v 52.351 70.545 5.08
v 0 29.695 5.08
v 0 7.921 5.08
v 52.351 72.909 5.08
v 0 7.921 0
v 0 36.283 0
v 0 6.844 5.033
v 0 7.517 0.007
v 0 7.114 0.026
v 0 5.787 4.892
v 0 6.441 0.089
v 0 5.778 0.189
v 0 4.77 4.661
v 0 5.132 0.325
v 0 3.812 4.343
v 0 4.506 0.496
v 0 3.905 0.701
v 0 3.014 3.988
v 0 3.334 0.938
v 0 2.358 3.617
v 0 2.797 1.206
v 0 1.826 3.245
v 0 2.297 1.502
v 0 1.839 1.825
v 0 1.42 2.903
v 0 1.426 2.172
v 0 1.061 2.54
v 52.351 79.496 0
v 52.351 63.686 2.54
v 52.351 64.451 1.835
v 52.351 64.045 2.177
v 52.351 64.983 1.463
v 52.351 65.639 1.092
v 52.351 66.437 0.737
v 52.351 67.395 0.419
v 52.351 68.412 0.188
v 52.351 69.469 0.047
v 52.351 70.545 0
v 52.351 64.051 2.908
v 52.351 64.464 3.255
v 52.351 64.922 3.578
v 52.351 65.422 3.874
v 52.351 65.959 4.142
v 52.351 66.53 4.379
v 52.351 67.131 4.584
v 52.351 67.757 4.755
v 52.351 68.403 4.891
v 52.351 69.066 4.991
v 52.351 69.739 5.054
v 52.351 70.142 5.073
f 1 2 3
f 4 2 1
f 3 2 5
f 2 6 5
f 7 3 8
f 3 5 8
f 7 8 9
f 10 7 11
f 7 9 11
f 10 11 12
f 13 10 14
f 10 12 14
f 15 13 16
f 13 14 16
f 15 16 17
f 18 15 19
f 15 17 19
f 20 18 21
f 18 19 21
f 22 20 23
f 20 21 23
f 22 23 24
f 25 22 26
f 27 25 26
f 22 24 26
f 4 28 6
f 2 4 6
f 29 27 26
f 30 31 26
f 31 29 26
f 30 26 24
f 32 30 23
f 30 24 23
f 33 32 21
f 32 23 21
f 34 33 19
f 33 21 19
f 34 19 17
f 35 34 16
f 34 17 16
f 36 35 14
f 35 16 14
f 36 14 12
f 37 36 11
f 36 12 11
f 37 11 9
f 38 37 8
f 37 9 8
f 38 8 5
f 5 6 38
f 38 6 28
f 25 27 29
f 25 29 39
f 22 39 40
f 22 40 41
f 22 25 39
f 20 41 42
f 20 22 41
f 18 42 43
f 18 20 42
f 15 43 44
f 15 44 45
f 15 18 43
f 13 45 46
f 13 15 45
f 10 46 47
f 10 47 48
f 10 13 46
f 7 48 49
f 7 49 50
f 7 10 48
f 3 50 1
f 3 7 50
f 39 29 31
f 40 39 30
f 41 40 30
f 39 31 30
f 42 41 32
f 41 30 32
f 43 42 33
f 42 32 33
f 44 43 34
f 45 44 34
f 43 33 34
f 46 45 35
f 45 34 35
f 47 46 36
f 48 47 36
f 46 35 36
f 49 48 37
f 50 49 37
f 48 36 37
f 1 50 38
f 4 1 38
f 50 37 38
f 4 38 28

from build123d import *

# Parameters (mm, degrees)
F1_DEPTH    = 5.08
F2_T1_DEPTH = 107.0243637673
F3_SIZE     = 5.07999


# Not quite as in the source:
# - a fillet or chamfer that OpenCascade refuses, or shapes differently, is made with other operations: its cross-section is extruded or revolved along the edge and cut away or added
# - a fillet or chamfer is up to 0.001 mm smaller than in the source, because OpenCascade refuses the exact size


with BuildPart() as f1:
    # F0 (on Top) → F1 (new body)
    with BuildSketch(Plane.XY):
        Polygon((0, 36.2825095654), (0, 0), (52.3514412344, 62.6247823238), (52.3514412344, 79.496473074), align=None)
    extrude(amount=F1_DEPTH)

    # F2: fillet of radius 5.08 on 2 edges, made by hand

    # F2_s2 → F2_t1 (cut)
    with BuildSketch(Plane(origin=(-8.1454025856, -9.7438399371, 0), x_dir=(0, 0, 1), z_dir=(0.6413702823, 0.7672314911, 0))):
        with BuildLine():
            ThreePointArc((0, 0), (3.5921024484, -1.4878975516), (5.08, -5.08))
            Line((5.08, -5.08), (5.08, 0))
            Line((5.08, 0), (0, 0))
        make_face()
        with BuildLine():
            ThreePointArc((5.08, 0), (1.4878975516, -1.4878975516), (0, -5.08))
            Line((0, -5.08), (0, 0))
            Line((0, 0), (5.08, 0))
        make_face()
    extrude(amount=F2_T1_DEPTH, mode=Mode.SUBTRACT)

    # F3 (size 5.08 in the source; OpenCascade refuses exactly that, so slightly less here)
    f3_edges = [f1.edges().sort_by_distance(p)[0] for p in [
        (26.175721, 57.889491, 5.08),
    ]]
    chamfer(f3_edges, length=F3_SIZE)


solid = f1.part
